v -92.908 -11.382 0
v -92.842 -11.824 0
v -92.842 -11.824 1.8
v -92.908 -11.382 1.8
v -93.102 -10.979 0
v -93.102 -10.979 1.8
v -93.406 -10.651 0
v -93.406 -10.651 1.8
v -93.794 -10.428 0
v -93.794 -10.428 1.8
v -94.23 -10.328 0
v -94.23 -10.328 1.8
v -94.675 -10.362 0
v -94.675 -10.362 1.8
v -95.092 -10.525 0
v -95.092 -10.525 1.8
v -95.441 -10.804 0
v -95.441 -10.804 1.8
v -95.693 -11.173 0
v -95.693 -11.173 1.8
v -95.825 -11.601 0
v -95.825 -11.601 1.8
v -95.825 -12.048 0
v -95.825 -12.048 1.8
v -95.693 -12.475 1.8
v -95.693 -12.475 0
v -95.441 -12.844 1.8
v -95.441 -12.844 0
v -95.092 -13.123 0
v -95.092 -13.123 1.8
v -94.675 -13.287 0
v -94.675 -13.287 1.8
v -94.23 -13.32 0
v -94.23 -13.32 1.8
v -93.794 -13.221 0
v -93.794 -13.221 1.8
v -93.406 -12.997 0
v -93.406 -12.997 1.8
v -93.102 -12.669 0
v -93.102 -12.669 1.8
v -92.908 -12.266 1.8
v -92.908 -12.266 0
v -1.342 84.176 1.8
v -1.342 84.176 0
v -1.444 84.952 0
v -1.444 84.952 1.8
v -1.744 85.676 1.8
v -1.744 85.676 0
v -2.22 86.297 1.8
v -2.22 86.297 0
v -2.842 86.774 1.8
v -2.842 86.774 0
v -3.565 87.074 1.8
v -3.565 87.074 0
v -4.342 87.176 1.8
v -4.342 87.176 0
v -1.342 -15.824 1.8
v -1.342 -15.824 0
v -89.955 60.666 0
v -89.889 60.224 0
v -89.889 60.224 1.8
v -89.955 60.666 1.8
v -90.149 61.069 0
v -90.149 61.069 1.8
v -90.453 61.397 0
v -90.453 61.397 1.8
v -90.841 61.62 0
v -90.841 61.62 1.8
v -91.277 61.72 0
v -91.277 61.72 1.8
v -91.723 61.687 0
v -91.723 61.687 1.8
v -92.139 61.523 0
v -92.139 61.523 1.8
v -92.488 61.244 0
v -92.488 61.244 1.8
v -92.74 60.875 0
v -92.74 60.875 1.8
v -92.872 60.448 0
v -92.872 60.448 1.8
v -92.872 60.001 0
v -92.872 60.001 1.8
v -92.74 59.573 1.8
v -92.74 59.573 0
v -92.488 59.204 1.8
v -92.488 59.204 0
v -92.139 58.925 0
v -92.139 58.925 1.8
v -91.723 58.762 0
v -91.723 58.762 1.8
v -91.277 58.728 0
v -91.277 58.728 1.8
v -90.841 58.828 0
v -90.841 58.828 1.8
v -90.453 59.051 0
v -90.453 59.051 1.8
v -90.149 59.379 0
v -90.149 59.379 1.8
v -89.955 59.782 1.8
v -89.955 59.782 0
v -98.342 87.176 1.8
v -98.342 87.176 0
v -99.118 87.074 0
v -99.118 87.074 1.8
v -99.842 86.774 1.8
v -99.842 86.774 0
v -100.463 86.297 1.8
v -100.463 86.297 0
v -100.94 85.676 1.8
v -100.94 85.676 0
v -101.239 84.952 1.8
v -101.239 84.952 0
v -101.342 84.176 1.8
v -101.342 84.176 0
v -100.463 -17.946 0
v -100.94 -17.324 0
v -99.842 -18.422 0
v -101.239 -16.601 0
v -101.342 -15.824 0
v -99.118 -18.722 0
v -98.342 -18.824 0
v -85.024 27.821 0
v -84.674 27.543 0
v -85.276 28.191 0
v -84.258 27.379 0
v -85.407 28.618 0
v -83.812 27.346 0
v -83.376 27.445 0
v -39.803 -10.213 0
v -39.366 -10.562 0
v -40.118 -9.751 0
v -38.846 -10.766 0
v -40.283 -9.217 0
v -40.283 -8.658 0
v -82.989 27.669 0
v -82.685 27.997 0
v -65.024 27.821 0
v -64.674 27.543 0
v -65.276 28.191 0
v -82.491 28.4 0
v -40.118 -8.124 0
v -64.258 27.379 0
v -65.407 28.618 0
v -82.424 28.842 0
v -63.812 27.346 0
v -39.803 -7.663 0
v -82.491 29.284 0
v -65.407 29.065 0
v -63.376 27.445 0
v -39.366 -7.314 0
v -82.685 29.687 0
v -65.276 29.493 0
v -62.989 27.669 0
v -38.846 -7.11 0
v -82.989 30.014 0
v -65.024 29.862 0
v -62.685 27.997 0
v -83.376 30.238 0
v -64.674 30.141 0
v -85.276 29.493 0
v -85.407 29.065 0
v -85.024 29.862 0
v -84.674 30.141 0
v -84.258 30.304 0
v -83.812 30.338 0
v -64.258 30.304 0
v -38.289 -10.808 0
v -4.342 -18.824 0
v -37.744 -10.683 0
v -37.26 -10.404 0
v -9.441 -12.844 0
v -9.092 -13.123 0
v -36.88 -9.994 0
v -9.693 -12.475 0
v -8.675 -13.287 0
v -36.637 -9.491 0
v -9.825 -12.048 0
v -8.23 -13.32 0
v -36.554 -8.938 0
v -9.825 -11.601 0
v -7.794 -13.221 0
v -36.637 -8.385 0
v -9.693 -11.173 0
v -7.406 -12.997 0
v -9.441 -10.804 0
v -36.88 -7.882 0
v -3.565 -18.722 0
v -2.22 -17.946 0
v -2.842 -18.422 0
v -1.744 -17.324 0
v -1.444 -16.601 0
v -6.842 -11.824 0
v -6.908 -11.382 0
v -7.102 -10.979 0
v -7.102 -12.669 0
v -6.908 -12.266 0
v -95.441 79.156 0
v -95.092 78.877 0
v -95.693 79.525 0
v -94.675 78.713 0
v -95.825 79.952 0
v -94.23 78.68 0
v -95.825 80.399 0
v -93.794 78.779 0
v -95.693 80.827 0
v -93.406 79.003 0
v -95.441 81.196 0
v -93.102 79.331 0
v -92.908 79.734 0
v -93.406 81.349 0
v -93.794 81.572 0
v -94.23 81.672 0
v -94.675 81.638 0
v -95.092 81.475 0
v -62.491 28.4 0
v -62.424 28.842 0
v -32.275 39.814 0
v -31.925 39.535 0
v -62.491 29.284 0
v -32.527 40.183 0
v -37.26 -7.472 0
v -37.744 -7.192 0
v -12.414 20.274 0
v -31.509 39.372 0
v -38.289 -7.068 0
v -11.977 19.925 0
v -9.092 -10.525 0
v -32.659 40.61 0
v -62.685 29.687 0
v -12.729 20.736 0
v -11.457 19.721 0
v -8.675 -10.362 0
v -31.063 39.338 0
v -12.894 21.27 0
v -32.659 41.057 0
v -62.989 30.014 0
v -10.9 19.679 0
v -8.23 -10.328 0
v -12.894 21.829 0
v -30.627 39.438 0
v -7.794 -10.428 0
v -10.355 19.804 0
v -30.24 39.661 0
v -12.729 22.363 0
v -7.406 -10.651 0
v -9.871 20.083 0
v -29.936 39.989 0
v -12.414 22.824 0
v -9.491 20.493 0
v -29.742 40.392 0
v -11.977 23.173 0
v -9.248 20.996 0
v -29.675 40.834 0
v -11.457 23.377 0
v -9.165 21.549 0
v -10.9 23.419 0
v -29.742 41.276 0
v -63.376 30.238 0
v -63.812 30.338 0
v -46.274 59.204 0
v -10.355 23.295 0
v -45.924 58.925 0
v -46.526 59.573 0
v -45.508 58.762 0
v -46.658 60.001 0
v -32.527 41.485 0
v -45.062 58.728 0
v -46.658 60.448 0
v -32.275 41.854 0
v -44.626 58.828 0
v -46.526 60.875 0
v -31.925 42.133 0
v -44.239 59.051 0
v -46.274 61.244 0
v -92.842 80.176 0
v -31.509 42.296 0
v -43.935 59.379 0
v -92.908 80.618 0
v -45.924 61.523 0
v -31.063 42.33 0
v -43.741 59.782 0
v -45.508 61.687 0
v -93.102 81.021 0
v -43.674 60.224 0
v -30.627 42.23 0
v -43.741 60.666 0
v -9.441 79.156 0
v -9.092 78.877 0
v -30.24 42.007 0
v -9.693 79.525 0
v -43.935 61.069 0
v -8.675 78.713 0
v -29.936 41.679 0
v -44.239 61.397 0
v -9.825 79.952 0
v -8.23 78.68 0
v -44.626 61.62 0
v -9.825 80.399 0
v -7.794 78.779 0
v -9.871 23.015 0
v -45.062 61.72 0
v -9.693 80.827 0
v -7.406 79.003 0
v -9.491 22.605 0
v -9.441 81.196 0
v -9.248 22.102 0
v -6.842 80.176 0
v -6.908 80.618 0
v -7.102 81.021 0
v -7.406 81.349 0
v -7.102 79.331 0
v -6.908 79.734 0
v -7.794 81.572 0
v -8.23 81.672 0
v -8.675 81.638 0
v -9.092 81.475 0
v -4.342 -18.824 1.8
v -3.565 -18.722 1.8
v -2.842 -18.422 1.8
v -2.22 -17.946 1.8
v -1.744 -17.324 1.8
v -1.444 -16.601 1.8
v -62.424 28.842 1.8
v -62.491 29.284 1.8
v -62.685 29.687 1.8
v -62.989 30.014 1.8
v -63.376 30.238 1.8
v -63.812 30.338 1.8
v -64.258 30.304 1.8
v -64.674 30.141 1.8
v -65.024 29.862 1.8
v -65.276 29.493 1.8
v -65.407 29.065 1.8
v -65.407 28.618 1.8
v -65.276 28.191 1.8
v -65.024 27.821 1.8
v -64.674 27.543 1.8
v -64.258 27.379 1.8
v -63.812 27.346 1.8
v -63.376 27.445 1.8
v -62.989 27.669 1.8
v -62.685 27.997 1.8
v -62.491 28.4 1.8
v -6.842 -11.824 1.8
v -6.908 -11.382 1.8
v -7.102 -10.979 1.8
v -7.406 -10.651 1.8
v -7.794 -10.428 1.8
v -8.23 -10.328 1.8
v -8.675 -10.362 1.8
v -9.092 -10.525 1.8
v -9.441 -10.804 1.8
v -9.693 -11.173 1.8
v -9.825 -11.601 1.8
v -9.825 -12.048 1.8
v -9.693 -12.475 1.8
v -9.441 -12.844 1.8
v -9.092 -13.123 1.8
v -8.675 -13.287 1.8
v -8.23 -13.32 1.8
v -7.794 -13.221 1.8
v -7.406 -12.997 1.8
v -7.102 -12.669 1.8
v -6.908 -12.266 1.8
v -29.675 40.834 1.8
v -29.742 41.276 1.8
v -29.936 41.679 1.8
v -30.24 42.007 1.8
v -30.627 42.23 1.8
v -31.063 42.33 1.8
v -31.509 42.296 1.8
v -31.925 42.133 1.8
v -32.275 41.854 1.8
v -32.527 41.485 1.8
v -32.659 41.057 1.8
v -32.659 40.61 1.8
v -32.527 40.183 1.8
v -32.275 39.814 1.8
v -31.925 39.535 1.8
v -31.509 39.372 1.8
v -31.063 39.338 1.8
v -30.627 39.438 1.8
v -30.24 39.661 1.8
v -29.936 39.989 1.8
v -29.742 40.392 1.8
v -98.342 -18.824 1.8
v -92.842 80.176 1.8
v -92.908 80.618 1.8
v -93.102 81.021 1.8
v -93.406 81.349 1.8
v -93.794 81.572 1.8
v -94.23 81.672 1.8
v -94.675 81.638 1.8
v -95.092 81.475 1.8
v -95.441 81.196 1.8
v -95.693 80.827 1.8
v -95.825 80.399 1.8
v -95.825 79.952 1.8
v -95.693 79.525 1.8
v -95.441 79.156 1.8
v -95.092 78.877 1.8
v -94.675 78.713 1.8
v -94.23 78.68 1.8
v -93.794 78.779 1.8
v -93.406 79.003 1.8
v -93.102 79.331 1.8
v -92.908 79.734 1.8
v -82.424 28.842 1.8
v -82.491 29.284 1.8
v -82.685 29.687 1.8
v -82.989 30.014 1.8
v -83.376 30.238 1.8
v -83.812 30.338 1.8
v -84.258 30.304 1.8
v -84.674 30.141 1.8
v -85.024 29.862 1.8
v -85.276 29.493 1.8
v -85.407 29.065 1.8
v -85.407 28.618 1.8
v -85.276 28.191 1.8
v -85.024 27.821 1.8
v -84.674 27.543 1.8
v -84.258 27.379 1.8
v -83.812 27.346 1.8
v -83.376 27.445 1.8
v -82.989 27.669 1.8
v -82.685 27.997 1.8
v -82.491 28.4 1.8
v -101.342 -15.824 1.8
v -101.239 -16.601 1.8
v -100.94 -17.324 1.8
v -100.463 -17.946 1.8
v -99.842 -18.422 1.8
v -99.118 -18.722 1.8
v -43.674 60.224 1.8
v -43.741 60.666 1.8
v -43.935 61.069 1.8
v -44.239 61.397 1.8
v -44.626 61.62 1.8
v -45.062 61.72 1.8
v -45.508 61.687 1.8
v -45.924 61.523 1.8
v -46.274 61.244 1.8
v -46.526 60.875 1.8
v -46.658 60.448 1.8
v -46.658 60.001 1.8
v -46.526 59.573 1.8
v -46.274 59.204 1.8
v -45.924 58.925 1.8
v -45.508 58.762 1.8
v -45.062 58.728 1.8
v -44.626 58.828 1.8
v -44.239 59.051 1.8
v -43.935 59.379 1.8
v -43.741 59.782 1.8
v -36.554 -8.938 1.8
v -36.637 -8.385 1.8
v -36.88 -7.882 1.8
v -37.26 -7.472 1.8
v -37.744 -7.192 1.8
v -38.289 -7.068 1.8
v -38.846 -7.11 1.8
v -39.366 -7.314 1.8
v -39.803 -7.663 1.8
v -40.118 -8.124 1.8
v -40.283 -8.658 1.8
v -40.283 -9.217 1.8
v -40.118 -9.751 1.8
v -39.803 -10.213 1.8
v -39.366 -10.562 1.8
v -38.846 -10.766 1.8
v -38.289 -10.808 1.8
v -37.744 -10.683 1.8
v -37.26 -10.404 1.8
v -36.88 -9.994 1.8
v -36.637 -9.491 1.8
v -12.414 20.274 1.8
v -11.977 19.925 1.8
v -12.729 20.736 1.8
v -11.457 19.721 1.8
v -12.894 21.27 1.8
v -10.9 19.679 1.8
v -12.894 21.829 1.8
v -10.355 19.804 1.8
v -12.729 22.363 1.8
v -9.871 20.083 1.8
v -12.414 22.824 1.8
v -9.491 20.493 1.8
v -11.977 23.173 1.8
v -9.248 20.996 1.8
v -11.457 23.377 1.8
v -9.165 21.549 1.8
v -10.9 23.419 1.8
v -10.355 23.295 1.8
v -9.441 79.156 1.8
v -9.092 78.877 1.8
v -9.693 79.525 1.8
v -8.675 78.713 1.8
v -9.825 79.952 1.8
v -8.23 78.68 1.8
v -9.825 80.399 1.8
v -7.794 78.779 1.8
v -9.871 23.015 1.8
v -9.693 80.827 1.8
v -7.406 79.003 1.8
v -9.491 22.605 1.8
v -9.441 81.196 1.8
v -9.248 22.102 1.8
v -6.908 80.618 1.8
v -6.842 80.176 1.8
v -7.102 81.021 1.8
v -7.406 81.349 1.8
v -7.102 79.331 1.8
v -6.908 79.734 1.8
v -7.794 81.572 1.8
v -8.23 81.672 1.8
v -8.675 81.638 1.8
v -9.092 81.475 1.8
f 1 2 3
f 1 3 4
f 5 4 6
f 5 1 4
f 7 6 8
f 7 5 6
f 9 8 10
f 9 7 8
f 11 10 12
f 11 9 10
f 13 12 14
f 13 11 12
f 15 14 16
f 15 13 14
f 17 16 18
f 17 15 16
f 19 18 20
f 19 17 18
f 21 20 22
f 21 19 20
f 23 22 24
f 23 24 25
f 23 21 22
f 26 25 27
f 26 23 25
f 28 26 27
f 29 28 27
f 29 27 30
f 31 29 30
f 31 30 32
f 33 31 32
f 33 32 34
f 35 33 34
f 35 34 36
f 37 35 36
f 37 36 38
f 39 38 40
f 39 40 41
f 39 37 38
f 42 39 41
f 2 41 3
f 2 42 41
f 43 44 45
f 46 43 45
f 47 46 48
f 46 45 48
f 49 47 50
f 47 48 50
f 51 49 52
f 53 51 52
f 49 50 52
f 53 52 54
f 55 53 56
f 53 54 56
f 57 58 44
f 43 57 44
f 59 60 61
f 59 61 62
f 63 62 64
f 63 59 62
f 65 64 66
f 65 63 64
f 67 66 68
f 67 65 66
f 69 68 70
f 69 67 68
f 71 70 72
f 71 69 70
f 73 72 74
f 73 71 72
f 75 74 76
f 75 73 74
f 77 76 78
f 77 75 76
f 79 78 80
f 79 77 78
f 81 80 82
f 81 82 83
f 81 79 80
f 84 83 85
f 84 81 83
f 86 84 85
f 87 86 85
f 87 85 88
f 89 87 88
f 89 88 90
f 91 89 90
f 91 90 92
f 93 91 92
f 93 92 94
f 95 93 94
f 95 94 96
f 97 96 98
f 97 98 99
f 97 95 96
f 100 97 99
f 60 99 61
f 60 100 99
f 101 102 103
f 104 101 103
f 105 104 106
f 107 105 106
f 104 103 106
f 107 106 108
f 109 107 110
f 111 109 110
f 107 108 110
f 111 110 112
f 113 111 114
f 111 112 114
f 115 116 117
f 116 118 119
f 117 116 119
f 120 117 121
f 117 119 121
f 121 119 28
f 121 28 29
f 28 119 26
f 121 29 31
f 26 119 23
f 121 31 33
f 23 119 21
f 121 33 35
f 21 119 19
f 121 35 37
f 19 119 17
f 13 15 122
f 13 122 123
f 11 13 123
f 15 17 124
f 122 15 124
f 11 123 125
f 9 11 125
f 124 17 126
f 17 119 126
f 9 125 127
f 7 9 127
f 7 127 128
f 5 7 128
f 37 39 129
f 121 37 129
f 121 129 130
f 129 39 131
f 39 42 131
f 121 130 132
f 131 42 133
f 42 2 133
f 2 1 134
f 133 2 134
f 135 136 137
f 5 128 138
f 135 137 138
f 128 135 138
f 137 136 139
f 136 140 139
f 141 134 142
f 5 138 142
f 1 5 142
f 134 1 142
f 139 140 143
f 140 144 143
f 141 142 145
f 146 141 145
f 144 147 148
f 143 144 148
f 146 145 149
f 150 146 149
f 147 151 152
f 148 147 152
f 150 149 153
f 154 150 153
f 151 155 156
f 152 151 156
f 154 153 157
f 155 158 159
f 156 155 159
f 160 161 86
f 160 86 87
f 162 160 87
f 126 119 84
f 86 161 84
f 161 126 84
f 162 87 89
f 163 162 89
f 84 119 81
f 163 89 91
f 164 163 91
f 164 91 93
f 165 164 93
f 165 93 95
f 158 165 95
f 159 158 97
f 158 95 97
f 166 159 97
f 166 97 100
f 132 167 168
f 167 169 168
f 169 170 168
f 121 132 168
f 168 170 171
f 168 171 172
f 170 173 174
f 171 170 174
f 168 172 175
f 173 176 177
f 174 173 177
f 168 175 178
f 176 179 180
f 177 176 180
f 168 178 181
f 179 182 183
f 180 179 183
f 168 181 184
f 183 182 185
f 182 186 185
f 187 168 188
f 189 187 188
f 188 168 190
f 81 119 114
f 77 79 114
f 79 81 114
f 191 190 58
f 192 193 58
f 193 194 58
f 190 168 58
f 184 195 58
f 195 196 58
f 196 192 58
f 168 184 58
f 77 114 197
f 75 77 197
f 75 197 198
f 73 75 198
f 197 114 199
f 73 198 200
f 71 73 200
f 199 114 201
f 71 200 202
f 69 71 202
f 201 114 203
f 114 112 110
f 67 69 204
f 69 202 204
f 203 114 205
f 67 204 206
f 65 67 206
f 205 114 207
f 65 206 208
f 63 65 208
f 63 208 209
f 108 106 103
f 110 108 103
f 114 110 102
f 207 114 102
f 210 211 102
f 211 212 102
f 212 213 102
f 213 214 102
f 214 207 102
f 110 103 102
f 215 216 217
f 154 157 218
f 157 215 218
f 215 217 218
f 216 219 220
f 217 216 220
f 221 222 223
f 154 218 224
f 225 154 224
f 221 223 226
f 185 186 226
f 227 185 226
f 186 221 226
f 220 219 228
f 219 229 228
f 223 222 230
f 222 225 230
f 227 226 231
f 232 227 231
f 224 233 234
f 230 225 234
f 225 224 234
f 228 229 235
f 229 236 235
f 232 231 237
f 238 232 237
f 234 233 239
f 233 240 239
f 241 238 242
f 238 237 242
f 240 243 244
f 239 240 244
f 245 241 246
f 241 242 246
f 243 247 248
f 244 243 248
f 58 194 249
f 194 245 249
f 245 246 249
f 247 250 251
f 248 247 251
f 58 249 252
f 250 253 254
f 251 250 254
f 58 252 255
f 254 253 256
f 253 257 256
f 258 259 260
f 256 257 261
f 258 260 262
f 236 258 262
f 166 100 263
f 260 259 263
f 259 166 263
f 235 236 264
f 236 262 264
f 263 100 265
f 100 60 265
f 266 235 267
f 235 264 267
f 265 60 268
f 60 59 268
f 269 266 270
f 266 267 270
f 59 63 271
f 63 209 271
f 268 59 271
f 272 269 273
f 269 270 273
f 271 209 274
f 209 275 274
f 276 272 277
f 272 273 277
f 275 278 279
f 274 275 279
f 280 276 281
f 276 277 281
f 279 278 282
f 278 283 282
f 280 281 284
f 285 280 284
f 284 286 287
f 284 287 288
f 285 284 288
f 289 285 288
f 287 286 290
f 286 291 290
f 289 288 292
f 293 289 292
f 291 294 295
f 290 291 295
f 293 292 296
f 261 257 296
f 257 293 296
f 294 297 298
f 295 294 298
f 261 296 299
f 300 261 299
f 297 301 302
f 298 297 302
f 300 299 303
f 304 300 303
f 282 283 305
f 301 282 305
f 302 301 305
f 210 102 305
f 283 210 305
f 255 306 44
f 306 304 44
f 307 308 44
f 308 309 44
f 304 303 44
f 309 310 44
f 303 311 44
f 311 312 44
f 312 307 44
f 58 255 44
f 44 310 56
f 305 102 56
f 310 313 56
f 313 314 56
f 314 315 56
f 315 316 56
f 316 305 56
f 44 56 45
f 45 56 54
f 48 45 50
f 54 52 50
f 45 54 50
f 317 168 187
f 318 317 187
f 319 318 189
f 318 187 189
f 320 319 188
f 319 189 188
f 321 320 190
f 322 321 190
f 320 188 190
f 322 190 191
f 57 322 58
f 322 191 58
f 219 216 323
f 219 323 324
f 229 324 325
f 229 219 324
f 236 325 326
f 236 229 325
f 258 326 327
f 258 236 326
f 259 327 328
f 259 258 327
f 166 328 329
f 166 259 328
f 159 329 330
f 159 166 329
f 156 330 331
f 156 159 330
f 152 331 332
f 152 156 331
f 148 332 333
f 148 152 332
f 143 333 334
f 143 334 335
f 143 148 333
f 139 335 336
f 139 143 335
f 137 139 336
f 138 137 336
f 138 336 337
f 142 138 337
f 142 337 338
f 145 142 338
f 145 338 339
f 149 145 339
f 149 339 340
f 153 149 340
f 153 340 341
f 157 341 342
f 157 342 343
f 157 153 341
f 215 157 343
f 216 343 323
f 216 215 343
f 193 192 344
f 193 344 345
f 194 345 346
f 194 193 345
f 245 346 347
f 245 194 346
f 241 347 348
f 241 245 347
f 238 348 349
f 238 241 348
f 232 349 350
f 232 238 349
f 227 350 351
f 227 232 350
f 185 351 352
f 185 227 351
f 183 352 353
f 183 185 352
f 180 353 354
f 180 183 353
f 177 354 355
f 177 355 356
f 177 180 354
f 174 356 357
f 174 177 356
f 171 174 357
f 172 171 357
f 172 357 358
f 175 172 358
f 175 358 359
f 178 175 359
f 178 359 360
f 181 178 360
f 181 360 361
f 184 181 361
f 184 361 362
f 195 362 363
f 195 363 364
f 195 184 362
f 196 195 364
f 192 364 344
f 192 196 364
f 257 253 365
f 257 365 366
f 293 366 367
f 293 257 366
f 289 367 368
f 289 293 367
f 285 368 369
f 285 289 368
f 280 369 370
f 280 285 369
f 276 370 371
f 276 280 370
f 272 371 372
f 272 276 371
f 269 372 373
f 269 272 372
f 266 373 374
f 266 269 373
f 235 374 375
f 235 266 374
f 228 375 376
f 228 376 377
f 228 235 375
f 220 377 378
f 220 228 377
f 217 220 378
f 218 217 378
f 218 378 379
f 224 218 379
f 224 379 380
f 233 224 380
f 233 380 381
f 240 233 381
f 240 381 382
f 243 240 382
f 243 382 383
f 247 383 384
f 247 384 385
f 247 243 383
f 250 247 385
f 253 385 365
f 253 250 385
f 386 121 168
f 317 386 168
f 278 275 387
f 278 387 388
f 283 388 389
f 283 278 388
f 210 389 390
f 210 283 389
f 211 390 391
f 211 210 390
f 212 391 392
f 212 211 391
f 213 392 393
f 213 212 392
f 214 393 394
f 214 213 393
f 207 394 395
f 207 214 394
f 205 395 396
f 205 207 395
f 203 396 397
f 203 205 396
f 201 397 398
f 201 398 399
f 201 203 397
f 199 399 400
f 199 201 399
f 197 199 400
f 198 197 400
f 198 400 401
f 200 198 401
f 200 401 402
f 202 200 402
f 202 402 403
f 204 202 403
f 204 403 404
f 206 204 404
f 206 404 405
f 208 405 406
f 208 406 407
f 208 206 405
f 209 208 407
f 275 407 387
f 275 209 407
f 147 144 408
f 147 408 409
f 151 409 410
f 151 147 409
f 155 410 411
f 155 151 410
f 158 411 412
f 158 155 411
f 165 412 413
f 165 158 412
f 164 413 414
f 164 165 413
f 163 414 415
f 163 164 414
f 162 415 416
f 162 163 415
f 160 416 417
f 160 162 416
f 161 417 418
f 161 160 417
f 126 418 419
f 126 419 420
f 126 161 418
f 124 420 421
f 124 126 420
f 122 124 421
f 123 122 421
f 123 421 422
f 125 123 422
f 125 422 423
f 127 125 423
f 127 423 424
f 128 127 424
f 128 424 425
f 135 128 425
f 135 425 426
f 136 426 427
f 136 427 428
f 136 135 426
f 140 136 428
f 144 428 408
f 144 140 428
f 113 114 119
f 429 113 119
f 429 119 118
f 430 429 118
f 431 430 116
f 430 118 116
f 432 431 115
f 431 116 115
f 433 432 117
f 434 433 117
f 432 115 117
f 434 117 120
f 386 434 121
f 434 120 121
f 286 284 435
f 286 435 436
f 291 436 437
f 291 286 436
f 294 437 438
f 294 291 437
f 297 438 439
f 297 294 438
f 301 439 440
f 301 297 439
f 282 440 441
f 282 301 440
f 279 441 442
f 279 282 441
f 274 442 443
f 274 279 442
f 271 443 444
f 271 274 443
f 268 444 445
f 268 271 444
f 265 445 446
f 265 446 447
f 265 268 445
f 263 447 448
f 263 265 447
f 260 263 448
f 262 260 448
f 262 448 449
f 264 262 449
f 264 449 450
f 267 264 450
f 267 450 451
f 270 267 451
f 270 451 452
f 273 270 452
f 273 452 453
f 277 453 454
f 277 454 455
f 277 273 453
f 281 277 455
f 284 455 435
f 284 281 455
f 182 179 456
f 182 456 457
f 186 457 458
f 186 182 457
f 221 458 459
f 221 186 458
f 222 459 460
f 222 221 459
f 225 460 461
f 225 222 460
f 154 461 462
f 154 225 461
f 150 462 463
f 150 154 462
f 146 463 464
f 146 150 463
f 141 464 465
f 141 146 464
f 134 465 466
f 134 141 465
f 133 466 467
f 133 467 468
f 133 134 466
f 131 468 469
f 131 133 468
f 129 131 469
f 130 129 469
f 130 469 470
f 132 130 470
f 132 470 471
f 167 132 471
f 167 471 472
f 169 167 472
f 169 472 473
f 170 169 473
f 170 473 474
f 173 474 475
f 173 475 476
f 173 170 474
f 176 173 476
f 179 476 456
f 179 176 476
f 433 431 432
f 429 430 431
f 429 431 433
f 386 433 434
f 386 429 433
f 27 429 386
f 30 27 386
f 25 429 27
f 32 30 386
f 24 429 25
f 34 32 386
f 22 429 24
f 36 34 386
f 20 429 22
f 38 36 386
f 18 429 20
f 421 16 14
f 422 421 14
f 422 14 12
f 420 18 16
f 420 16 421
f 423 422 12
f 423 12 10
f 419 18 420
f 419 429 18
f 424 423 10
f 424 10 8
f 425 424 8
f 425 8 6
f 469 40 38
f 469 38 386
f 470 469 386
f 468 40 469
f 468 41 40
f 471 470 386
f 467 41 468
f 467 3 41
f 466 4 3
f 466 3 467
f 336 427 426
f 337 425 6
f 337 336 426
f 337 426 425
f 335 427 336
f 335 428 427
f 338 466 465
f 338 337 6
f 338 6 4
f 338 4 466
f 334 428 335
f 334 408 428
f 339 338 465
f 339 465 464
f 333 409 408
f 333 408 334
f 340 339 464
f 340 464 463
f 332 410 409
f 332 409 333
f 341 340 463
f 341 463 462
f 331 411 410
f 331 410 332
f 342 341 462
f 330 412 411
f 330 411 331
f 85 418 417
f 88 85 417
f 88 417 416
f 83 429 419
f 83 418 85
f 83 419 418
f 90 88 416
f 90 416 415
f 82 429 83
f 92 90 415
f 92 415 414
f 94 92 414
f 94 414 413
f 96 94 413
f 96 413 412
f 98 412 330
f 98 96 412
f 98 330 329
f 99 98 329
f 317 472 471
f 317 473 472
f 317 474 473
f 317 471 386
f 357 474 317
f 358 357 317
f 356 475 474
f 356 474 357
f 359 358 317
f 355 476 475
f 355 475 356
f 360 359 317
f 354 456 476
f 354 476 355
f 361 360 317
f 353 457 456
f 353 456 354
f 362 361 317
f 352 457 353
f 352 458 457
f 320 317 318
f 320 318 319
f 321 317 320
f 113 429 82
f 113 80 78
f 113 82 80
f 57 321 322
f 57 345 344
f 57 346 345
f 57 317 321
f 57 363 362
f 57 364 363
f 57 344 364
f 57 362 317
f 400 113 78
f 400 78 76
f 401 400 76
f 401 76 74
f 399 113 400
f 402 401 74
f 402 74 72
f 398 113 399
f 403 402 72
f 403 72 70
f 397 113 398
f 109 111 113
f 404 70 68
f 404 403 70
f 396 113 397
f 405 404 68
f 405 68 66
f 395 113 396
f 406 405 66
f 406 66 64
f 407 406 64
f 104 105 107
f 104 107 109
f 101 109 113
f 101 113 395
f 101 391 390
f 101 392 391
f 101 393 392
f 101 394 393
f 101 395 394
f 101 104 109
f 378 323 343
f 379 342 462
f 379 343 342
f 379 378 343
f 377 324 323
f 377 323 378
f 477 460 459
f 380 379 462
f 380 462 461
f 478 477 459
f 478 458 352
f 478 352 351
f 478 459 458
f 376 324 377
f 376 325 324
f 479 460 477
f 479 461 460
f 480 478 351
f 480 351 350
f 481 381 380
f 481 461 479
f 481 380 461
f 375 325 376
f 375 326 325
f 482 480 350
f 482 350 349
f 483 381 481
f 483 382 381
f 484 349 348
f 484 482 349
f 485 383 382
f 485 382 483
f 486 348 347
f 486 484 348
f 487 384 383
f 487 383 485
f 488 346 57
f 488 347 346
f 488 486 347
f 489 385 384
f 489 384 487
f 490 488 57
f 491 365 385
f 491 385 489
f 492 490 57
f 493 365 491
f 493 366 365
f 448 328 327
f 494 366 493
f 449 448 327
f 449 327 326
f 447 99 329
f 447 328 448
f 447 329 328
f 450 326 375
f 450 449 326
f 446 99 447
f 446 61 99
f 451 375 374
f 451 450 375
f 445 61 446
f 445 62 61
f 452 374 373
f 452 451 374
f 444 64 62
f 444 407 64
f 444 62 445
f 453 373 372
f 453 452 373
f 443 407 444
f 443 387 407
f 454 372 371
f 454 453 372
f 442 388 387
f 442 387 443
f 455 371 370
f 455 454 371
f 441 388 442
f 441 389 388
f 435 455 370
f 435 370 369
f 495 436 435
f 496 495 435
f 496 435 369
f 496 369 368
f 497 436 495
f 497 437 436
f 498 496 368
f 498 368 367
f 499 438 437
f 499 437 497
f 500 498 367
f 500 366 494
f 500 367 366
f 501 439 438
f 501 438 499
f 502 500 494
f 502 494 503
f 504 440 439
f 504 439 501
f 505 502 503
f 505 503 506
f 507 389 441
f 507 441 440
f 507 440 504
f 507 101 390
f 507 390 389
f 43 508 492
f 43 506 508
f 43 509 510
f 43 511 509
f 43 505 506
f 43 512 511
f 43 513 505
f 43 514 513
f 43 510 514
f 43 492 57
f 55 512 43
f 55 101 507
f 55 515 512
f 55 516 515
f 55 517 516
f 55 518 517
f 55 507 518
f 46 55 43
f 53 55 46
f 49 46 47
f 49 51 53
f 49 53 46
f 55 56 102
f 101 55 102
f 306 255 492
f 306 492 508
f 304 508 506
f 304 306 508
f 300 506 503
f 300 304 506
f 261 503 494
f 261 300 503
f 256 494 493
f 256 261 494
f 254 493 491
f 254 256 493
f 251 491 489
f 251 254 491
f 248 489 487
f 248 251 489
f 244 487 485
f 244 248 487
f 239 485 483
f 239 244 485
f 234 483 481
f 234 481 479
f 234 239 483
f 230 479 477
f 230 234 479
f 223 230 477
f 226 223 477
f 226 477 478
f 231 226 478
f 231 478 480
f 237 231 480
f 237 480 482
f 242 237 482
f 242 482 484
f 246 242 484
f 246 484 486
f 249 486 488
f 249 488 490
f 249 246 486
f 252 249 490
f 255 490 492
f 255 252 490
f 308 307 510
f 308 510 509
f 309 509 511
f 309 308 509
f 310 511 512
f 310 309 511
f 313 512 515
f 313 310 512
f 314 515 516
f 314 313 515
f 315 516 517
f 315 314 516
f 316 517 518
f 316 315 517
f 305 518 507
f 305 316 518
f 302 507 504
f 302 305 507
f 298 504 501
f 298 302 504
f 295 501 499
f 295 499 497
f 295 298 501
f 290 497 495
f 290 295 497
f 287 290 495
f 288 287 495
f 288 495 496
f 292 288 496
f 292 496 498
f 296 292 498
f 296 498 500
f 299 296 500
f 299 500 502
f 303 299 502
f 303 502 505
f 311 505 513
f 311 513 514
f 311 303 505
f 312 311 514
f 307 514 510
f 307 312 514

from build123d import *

# Parameters (mm, degrees)
F0_R     = 1.5
F0_R_2   = 1.875
F1_DEPTH = 1.8


with BuildPart() as f1:
    # F0 (on Top) → F1 (new body)
    with BuildSketch(Plane.XY):
        with BuildLine():
            Line((-98.341699, -18.824226), (-4.341699, -18.824226))
            ThreePointArc((-4.341699, -18.824226), (-2.220379, -17.945546), (-1.341699, -15.824226))
            Line((-1.341699, -15.824226), (-1.341699, 84.175774))
            ThreePointArc((-1.341699, 84.175774), (-2.220379, 86.297094), (-4.341699, 87.175774))
            Line((-4.341699, 87.175774), (-98.341699, 87.175774))
            ThreePointArc((-98.341699, 87.175774), (-100.46302, 86.297094), (-101.341699, 84.175774))
            Line((-101.341699, 84.175774), (-101.341699, -15.824226))
            ThreePointArc((-101.341699, -15.824226), (-100.46302, -17.945546), (-98.341699, -18.824226))
        make_face()
        with Locations((-94.341699, -11.824226)):
            Circle(F0_R, mode=Mode.SUBTRACT)
        with Locations((-83.92407, 28.841723)):
            Circle(F0_R, mode=Mode.SUBTRACT)
        with Locations((-63.92407, 28.841723)):
            Circle(F0_R, mode=Mode.SUBTRACT)
        with Locations((-91.388723, 60.224189)):
            Circle(F0_R, mode=Mode.SUBTRACT)
        with Locations((-94.341699, 80.175774)):
            Circle(F0_R, mode=Mode.SUBTRACT)
        with Locations((-38.428727, -8.937866)):
            Circle(F0_R_2, mode=Mode.SUBTRACT)
        with Locations((-8.341699, -11.824226)):
            Circle(F0_R, mode=Mode.SUBTRACT)
        with Locations((-11.03972, 21.549158)):
            Circle(F0_R_2, mode=Mode.SUBTRACT)
        with Locations((-45.174403, 60.224189)):
            Circle(F0_R, mode=Mode.SUBTRACT)
        with Locations((-31.175356, 40.833933)):
            Circle(F0_R, mode=Mode.SUBTRACT)
        with Locations((-8.341699, 80.175774)):
            Circle(F0_R, mode=Mode.SUBTRACT)
    extrude(amount=F1_DEPTH)


solid = f1.part
